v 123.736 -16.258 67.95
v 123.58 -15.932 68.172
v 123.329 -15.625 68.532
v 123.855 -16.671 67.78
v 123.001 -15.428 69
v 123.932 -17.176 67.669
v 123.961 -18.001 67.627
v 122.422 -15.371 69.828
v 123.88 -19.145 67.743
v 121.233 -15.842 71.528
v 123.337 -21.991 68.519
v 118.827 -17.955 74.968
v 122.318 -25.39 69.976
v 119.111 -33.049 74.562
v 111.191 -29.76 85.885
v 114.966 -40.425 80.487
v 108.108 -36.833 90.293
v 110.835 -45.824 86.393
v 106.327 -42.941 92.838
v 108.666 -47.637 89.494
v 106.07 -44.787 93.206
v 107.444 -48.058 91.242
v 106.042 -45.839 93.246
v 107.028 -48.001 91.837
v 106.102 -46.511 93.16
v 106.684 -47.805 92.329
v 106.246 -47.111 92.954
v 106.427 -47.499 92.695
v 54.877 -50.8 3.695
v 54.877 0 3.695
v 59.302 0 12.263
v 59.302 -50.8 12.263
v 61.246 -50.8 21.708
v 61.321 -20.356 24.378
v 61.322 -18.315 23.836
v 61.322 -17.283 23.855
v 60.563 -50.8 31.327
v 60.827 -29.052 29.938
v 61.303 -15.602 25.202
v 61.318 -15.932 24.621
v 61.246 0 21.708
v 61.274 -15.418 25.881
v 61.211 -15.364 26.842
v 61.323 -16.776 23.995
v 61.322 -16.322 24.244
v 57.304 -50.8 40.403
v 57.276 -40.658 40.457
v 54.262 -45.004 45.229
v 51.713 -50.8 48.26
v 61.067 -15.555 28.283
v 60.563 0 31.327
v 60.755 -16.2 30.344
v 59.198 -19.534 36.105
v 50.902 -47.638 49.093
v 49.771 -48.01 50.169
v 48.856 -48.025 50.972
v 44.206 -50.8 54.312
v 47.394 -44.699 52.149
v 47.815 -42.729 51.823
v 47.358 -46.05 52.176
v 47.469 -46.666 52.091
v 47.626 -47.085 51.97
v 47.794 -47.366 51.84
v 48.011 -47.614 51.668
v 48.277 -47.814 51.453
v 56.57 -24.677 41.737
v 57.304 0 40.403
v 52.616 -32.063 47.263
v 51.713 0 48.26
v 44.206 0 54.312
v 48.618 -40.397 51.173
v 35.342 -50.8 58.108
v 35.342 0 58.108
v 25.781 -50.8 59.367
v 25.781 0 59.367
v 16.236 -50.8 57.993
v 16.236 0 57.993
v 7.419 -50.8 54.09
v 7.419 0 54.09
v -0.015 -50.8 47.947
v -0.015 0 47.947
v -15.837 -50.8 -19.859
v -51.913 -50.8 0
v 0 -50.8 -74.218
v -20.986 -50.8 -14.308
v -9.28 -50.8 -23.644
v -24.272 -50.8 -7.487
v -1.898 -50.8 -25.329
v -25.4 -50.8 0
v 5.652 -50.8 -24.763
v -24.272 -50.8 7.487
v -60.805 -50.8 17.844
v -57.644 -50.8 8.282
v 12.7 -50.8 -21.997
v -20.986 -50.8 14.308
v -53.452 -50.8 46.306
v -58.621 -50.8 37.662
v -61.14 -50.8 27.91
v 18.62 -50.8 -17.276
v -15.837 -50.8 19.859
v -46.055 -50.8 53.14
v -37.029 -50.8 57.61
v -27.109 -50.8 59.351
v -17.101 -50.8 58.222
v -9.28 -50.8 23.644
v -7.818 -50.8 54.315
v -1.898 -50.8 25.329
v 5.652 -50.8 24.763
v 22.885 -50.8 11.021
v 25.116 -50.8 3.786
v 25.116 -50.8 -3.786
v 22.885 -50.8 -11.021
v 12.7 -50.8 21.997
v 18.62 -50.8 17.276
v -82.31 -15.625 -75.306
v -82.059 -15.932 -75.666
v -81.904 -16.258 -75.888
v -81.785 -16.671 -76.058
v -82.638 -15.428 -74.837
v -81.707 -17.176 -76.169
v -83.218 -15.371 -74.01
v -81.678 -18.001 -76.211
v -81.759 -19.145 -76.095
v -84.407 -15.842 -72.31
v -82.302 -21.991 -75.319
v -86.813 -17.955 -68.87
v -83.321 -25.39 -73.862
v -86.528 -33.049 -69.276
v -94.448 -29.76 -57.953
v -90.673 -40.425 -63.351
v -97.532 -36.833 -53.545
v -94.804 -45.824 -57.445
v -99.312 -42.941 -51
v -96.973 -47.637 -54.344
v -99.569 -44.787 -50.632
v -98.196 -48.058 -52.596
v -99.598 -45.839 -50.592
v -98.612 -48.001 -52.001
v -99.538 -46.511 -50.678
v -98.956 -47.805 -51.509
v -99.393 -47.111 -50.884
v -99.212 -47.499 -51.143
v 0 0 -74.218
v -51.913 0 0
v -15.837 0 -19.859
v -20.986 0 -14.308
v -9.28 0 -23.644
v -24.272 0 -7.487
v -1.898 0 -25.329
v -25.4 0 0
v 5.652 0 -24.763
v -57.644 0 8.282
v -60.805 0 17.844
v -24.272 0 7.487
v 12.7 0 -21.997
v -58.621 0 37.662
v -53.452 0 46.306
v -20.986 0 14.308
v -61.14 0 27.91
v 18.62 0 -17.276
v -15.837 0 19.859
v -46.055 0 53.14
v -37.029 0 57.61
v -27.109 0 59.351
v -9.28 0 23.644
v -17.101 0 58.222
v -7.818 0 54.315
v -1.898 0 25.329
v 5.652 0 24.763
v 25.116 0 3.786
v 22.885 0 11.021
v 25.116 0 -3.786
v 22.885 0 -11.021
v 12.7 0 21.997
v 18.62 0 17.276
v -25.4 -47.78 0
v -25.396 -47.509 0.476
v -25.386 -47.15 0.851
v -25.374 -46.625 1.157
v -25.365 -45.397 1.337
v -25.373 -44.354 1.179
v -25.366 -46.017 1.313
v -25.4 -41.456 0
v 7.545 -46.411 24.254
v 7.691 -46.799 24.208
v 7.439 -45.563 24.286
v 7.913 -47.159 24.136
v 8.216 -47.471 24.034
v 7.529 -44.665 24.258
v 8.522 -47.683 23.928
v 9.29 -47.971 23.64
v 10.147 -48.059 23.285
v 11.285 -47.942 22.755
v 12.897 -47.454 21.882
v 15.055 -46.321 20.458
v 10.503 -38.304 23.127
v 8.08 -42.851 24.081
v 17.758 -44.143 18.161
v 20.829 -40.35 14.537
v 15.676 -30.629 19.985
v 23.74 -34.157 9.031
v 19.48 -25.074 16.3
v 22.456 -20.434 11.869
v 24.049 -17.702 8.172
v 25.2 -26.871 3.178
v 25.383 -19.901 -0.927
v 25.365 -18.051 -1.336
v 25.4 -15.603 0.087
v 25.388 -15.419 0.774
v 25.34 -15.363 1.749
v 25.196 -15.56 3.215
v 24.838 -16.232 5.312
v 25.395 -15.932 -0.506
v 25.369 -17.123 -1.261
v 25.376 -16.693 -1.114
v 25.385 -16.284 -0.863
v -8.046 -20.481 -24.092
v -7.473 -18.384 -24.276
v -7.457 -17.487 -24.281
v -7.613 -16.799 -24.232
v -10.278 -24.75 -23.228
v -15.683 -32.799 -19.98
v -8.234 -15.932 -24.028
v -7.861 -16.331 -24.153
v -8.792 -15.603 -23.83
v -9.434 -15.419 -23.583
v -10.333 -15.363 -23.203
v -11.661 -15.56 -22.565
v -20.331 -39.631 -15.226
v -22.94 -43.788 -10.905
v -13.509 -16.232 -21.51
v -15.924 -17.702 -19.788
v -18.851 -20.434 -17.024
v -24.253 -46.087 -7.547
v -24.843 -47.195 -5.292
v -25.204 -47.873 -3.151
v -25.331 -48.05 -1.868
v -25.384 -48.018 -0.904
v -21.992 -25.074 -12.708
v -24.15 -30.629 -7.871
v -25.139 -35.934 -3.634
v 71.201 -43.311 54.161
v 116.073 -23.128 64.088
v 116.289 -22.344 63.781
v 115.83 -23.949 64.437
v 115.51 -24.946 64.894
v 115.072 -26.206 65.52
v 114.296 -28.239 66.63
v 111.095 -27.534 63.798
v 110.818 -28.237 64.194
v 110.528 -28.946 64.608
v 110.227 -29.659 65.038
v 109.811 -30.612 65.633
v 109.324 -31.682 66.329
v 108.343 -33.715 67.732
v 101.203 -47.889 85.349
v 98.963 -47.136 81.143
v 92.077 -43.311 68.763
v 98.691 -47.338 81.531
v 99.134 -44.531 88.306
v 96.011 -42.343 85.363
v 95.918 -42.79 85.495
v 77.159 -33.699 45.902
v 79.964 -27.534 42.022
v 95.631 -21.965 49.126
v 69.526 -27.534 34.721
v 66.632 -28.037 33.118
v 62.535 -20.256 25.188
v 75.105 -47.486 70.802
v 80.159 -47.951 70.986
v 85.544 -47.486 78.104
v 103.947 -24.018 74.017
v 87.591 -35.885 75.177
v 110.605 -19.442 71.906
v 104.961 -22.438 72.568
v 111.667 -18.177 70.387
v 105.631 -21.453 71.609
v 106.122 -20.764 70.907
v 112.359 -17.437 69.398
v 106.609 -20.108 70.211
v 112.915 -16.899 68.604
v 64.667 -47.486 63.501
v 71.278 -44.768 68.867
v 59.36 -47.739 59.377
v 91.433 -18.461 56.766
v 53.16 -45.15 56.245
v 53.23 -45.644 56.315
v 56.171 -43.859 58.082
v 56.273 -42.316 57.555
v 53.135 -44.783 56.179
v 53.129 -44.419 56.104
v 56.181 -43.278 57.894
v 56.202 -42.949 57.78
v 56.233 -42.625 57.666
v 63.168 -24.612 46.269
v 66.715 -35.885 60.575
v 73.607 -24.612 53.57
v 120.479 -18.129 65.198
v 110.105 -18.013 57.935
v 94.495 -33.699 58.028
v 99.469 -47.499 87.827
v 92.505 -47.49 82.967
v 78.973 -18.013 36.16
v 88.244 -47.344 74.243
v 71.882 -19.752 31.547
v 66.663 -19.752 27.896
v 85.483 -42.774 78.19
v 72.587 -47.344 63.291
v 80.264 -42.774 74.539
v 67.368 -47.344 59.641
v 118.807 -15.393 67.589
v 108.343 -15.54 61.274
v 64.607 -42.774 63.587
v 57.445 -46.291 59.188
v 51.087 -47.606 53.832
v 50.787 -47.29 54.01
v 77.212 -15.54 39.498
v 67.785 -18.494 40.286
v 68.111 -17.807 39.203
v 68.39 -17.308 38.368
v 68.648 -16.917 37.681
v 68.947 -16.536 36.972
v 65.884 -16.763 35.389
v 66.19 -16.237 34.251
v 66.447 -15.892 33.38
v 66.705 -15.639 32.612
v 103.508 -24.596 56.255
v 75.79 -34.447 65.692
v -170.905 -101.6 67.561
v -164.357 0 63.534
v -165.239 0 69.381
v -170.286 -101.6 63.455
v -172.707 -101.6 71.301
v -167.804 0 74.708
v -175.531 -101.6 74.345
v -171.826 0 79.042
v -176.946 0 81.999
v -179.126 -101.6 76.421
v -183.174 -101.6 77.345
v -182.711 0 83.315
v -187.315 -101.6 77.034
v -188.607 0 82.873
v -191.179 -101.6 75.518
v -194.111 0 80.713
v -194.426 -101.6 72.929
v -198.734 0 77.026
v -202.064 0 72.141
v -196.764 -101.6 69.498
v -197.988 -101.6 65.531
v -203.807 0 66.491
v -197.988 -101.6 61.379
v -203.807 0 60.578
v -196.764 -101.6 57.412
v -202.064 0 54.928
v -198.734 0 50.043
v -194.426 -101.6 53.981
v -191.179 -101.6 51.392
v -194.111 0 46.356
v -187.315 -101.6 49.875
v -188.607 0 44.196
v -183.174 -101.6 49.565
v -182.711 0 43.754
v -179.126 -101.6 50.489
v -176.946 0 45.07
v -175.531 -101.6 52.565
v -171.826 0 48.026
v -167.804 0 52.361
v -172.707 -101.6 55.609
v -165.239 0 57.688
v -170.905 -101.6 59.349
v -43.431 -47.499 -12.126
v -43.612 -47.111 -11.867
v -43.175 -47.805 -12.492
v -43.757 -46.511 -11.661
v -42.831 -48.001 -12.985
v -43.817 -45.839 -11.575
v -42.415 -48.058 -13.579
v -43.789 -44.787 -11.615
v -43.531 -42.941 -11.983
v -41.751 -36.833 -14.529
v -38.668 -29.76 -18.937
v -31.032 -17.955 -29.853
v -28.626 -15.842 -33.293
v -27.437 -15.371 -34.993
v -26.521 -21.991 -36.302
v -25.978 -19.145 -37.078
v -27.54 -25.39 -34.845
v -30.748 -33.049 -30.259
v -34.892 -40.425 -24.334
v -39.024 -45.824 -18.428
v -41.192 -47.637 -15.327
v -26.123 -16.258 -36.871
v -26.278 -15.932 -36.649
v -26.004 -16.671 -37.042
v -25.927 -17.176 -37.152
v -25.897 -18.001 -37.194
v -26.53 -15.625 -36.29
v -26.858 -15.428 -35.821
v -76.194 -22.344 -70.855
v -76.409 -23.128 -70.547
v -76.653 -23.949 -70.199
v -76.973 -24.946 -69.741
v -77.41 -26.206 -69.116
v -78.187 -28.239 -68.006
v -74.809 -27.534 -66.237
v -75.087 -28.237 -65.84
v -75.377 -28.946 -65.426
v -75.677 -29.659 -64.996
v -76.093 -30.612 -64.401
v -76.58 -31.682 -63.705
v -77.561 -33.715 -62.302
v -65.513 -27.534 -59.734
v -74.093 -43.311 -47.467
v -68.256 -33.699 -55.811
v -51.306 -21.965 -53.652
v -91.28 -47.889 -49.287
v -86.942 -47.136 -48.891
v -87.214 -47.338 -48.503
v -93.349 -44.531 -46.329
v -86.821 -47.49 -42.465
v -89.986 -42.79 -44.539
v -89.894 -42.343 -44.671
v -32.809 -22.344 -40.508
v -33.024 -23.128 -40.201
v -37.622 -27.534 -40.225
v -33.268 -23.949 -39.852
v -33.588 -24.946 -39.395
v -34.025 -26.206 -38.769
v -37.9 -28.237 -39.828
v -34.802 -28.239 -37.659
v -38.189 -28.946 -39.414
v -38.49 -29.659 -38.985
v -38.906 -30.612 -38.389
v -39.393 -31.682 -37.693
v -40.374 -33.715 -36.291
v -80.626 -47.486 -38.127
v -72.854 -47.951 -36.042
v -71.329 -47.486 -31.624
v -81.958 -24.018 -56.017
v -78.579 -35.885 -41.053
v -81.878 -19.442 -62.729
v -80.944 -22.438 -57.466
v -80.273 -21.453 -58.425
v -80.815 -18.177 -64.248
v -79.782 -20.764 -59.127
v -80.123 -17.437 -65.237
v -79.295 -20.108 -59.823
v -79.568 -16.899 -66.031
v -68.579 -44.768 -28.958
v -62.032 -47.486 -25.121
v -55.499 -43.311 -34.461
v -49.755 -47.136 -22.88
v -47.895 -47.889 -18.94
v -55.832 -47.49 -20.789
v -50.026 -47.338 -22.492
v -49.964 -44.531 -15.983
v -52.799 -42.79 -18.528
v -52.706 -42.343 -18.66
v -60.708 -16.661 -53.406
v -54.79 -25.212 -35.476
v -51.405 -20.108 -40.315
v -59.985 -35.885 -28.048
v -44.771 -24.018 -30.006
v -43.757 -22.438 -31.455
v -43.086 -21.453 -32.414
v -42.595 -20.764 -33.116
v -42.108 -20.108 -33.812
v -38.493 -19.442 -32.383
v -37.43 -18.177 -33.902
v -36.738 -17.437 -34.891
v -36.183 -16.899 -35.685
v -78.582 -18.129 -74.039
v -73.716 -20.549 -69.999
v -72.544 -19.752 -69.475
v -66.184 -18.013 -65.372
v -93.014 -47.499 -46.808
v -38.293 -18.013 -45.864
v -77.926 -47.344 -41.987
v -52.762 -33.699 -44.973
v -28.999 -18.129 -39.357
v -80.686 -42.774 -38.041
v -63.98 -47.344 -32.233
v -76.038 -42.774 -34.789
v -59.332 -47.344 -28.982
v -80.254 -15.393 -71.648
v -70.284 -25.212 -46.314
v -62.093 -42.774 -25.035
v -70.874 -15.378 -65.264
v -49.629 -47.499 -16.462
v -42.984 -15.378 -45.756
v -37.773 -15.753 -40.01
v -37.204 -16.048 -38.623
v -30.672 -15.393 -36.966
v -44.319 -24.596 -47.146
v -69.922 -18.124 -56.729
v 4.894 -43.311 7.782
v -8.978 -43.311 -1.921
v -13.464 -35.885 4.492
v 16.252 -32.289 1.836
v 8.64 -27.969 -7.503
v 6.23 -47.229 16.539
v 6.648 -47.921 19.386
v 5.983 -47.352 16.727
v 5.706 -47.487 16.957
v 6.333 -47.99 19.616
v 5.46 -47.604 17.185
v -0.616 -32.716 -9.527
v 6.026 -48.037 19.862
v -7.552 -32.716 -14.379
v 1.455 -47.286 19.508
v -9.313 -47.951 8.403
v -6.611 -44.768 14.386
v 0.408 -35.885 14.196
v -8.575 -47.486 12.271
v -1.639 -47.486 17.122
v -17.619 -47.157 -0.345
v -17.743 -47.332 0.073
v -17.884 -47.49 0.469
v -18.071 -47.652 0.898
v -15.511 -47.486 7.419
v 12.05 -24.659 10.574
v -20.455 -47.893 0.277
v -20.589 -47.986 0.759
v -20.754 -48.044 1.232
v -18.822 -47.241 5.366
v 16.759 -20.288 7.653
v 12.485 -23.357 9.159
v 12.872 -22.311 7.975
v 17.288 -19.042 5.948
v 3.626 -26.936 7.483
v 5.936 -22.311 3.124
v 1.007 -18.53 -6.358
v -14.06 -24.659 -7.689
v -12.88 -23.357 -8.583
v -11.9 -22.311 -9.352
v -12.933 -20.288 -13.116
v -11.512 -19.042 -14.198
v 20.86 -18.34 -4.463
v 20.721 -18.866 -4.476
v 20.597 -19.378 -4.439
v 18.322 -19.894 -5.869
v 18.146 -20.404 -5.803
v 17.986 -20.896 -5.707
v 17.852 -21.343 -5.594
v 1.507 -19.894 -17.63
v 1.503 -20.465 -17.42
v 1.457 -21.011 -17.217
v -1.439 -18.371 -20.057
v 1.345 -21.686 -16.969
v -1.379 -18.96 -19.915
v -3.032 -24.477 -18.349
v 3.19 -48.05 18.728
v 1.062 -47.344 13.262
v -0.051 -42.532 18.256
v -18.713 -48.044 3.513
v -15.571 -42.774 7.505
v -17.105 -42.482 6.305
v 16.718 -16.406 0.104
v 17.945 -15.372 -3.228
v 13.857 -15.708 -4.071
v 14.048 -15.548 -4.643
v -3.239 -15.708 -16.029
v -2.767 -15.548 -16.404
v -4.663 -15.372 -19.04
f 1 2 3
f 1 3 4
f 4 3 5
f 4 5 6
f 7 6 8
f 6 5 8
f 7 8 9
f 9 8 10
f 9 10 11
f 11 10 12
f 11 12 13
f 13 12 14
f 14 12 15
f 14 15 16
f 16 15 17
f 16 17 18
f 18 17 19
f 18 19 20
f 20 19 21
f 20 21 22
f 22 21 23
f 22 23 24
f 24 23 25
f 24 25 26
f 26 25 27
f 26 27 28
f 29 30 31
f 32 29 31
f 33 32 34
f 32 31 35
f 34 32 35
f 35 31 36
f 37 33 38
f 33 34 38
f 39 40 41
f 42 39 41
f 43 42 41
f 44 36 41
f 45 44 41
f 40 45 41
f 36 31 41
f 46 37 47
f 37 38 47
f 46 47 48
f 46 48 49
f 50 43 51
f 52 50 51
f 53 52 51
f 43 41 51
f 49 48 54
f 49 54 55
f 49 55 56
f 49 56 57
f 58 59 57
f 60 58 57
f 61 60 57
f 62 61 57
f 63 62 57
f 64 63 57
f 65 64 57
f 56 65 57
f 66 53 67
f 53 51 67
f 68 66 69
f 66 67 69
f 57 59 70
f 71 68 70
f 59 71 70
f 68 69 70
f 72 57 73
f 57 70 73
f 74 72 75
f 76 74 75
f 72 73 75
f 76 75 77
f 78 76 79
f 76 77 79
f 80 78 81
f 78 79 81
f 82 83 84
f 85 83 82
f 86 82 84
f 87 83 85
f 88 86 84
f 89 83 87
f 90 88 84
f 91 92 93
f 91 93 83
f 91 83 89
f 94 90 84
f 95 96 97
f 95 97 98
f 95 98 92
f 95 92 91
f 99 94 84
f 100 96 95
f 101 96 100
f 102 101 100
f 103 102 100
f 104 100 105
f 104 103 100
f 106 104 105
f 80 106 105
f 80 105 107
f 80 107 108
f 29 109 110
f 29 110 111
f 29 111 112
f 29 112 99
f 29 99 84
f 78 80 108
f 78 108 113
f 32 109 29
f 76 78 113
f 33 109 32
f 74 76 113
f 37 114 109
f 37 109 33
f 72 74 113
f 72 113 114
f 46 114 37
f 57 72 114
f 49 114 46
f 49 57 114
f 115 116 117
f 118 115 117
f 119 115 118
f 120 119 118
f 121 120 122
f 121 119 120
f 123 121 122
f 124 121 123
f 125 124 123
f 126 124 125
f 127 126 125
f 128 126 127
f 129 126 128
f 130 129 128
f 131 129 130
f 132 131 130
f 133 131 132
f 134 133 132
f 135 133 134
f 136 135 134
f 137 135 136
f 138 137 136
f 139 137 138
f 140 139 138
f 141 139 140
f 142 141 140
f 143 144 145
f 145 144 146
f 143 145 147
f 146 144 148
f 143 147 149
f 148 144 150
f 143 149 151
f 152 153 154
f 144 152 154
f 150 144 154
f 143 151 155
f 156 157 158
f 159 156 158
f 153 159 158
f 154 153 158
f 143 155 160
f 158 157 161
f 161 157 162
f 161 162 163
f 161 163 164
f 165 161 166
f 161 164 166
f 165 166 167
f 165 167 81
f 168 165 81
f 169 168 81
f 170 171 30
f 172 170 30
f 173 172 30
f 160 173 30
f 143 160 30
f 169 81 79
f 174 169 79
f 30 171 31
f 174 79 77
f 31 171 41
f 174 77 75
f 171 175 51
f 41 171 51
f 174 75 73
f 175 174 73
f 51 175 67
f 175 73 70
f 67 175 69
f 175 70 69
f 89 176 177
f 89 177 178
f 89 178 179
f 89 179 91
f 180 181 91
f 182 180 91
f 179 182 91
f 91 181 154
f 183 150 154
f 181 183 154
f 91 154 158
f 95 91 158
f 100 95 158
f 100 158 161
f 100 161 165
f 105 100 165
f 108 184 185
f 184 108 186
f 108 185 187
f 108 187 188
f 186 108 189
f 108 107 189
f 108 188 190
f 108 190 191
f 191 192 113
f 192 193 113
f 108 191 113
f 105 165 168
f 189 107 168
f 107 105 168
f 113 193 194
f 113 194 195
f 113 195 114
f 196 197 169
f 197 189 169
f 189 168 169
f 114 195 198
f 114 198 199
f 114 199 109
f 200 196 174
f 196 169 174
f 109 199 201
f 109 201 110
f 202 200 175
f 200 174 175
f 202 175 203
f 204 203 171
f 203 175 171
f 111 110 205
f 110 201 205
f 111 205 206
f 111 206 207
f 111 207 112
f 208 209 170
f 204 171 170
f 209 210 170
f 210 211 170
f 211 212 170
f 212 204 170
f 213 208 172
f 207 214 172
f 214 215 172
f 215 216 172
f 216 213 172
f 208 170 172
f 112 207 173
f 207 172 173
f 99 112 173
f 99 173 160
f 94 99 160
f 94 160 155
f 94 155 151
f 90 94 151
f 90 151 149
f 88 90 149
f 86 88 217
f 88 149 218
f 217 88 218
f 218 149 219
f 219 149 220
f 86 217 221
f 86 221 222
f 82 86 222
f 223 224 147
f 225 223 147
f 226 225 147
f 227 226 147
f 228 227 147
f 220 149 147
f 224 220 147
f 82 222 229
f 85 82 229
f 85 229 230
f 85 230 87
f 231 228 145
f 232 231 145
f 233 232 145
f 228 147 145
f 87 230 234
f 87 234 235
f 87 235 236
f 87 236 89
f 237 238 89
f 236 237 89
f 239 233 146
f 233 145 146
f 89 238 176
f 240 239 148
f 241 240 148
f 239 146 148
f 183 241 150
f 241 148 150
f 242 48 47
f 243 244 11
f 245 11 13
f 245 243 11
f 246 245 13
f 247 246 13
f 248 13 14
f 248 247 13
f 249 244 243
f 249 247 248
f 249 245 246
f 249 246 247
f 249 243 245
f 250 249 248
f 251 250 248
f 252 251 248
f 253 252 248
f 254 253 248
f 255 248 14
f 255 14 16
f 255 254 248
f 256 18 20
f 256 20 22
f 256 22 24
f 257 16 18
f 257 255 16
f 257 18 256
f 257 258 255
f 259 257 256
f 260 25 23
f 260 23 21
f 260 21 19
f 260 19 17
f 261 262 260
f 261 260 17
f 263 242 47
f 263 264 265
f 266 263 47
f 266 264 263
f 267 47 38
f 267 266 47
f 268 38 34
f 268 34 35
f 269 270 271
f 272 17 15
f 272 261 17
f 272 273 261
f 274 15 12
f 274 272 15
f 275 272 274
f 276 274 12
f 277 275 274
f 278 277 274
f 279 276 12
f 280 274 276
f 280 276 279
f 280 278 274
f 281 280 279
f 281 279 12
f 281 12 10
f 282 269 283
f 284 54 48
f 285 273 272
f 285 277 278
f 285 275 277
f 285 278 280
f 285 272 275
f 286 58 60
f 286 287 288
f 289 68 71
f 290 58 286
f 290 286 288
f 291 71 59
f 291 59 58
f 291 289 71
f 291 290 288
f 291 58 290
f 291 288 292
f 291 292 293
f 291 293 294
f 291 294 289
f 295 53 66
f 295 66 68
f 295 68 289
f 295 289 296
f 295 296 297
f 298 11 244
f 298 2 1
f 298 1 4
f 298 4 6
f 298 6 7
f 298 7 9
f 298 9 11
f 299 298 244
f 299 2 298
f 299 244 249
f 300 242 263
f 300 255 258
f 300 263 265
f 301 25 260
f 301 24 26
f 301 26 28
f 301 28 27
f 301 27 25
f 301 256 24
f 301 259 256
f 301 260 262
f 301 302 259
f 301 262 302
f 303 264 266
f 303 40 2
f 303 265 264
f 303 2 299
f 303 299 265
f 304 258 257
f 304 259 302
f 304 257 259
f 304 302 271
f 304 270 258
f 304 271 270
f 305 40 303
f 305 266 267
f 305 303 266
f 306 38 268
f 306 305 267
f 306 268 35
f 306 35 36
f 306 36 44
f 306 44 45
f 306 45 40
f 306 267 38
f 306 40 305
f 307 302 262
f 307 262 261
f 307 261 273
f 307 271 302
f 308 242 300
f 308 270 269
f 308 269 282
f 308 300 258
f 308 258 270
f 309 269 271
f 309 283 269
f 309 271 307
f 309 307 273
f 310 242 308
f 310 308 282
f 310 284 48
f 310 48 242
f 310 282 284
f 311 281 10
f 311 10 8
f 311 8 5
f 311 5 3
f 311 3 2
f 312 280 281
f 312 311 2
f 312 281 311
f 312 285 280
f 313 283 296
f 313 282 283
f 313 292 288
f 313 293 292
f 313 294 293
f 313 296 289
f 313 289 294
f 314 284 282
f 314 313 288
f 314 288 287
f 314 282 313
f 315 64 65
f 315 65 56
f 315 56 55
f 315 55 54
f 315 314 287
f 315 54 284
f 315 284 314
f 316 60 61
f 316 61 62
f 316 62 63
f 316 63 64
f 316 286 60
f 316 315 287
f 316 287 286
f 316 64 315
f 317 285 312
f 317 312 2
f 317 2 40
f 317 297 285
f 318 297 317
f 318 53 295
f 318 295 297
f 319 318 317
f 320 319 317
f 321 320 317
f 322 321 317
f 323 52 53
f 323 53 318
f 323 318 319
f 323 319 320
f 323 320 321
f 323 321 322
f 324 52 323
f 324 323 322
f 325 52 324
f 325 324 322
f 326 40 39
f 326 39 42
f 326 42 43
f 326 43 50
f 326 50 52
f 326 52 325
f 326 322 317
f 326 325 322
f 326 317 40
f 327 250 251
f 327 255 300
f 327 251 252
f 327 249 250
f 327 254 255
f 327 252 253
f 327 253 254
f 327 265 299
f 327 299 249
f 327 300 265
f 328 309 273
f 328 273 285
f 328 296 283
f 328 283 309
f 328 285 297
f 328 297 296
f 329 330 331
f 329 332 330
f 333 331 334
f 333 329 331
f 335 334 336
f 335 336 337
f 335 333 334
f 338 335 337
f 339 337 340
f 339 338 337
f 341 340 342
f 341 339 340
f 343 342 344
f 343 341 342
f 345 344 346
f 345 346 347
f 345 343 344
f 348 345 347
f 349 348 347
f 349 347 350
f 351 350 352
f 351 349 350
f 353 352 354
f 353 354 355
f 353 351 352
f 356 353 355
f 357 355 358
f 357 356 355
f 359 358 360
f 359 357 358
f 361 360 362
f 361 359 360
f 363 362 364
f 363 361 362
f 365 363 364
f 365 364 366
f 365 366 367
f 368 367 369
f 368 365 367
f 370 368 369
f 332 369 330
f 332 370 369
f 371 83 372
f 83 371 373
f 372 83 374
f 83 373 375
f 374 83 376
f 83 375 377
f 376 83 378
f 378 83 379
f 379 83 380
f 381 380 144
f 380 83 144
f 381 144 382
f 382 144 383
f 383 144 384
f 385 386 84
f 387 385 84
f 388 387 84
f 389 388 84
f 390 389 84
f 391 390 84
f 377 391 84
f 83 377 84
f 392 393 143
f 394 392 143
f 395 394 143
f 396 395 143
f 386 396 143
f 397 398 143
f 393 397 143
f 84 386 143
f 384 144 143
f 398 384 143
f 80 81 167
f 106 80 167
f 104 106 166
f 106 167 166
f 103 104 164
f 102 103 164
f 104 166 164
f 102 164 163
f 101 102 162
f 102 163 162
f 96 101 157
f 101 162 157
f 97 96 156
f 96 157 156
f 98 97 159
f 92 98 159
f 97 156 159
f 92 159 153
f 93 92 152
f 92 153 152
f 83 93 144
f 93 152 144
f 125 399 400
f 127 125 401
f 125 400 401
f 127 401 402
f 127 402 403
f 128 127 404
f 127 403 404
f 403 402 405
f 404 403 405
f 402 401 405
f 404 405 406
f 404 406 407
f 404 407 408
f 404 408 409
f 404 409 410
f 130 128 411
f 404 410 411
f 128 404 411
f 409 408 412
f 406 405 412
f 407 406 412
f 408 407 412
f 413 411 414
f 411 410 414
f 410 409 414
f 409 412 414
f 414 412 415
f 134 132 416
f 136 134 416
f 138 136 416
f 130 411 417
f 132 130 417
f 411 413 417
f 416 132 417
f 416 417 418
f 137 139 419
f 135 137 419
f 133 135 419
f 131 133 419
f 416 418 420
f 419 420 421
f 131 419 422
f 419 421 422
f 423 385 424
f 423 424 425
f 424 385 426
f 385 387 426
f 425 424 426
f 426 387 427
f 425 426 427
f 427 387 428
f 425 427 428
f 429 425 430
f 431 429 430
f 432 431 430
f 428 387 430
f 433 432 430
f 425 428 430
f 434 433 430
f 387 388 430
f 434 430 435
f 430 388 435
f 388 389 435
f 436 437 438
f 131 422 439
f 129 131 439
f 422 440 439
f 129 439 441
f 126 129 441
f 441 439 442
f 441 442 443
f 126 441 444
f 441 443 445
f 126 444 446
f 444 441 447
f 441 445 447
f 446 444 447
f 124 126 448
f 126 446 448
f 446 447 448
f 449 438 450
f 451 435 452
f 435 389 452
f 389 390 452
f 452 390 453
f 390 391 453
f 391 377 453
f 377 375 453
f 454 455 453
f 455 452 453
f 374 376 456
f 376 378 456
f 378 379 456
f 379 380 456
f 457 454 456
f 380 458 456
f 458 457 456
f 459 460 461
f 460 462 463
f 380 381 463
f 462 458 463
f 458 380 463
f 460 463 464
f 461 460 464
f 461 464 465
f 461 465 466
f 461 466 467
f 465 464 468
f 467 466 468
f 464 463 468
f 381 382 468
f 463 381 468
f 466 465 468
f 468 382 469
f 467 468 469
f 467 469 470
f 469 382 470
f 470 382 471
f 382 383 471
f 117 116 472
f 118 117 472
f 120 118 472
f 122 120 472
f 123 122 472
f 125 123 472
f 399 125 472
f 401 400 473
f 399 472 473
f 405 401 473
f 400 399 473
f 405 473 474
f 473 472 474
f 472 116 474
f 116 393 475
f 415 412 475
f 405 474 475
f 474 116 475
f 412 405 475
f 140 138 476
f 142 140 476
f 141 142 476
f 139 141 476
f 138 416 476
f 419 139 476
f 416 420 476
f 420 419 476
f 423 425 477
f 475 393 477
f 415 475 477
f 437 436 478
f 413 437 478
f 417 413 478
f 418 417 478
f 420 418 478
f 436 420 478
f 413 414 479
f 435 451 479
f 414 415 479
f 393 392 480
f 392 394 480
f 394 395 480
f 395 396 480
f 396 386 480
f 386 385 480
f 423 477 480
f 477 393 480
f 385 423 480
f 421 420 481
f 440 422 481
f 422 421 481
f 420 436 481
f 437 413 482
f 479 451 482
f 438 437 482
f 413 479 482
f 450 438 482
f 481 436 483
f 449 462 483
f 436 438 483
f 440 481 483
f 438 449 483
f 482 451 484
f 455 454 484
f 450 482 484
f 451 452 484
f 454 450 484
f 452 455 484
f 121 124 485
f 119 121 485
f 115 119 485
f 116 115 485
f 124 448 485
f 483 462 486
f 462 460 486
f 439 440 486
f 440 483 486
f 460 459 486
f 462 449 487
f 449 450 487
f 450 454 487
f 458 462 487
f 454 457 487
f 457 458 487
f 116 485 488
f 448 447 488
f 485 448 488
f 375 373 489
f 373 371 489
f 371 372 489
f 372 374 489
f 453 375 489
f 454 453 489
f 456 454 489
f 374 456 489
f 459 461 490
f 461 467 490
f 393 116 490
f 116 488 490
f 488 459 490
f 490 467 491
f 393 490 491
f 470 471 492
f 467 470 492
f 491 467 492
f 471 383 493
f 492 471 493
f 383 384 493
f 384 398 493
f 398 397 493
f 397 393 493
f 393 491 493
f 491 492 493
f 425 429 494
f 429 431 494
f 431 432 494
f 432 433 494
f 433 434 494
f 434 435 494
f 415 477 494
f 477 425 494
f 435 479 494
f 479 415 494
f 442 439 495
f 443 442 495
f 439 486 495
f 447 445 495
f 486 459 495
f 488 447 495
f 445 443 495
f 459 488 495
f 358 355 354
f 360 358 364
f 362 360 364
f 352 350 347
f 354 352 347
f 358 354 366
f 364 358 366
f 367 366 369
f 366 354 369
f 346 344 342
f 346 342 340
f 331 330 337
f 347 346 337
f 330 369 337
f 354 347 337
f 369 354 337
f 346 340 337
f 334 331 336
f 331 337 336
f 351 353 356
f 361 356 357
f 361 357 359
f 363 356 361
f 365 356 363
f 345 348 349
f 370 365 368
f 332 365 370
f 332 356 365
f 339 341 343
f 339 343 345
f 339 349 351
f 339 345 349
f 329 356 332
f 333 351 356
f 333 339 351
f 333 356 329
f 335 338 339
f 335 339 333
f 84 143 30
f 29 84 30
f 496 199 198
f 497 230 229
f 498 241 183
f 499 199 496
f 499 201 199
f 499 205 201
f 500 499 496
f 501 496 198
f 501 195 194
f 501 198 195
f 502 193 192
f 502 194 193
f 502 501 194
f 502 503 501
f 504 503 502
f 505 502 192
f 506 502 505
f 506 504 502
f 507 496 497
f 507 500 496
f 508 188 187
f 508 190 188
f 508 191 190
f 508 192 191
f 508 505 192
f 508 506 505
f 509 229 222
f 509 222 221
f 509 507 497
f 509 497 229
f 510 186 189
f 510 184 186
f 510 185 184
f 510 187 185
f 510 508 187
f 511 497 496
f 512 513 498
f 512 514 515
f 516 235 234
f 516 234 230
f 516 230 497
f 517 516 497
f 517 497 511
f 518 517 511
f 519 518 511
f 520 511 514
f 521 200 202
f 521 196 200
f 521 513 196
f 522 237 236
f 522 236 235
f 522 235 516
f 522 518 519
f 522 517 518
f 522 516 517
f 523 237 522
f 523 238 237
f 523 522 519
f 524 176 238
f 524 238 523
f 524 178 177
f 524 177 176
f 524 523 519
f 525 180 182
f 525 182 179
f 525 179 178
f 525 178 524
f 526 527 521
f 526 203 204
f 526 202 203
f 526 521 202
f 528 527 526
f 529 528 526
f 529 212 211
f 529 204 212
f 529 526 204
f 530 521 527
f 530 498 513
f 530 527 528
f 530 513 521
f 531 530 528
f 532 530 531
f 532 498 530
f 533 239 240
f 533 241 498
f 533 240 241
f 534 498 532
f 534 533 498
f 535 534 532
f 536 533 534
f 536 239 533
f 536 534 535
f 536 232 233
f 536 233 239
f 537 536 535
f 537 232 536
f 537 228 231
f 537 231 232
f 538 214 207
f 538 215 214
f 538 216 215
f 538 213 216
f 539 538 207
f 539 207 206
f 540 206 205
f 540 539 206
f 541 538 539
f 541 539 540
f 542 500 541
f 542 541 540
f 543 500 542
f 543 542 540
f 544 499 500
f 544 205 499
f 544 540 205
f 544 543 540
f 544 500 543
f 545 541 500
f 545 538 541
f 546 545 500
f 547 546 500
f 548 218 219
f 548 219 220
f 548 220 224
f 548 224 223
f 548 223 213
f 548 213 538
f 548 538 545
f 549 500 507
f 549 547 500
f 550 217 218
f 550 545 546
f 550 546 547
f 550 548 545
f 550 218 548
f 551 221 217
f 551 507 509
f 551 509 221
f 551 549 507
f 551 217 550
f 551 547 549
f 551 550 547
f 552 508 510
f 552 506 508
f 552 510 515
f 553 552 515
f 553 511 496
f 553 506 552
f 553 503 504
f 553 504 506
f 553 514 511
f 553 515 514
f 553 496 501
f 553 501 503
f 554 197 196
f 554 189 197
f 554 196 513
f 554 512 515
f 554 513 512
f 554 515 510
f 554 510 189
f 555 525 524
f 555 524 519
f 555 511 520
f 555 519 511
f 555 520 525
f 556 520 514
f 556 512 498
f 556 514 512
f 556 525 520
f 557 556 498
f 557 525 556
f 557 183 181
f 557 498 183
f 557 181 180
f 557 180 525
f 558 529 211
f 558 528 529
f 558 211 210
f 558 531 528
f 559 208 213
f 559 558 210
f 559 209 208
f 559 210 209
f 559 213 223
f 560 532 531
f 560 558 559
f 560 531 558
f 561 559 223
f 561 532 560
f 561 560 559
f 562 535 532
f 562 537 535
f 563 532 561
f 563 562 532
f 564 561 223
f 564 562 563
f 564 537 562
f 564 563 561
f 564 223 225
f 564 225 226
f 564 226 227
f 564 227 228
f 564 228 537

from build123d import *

# Parameters (mm, degrees)
F1_DEPTH      = 50.8
F3_D          = 50.8
F5_DEPTH      = 182.88
F5_DEPTH_BACK = 68.072
F6_R          = 19.8356426408
F8_R          = 13.9286920451


with BuildPart() as f1:
    # F0 (on Front) → F1 (new body)
    with BuildSketch(Plane.XZ):
        with BuildLine():
            ThreePointArc((54.8773473594, 3.6953619276), (48.1667786574, 51.5429346167), (-0.0151121058, 47.9474726111))
            ThreePointArc((-0.0151121058, 47.9474726111), (-49.9981441233, 49.9879972058), (-51.9131808455, 0))
            Line((-51.9131808455, 0), (0, -74.2181763053))
            Line((0, -74.2181763053), (54.8773473594, 3.6953619276))
        make_face()
    extrude(amount=F1_DEPTH)

    # F3 (through all)
    with Locations(Plane.XZ.offset(50.8)):
        with Locations((0, 0)):
            Hole(F3_D / 2)

    # F4 (on face) → F5 (join, two sides)
    with BuildSketch(Plane(origin=(-34.8585047182, 0, -24.3823811029), x_dir=(0, -1, 0), z_dir=(-0.8194369758, 0, -0.5731692967))) as f5_sk:
        with BuildLine():
            add(Edge.make_bspline(
                [(15.9323047847, -14.9699412286), (23.3585237674, -22.7965449323), (43.3109830673, 3.5716687625), (63.2634423673, 29.9398824573), (35.8847640846, 11.3982724661), (8.5060858019, -7.143337525), (15.9323047847, -14.9699412286)],
                knots=[0, 0, 0, 2.0943951024, 2.0943951024, 4.1887902048, 4.1887902048, 6.2831853072, 6.2831853072, 6.2831853072], degree=2, weights=[1, 0.5, 1, 0.5, 1, 0.5, 1]))
        make_face()
    extrude(amount=-F5_DEPTH)
    extrude(f5_sk.sketch, amount=F5_DEPTH_BACK)


with BuildPart() as f9:
    # F6 (on Front) → F9 section 0
    with BuildSketch(Plane.XZ):
        with Locations((-184.1931194067, 63.5343641043)):
            Circle(F6_R)
    # F8 (on offset) → F9 section 1
    with BuildSketch(Plane.XZ.offset(101.6)):
        with Locations((-184.2150986195, 63.4549632668)):
            Circle(F8_R)
    loft()


solid = Compound([f1.part, f9.part])
